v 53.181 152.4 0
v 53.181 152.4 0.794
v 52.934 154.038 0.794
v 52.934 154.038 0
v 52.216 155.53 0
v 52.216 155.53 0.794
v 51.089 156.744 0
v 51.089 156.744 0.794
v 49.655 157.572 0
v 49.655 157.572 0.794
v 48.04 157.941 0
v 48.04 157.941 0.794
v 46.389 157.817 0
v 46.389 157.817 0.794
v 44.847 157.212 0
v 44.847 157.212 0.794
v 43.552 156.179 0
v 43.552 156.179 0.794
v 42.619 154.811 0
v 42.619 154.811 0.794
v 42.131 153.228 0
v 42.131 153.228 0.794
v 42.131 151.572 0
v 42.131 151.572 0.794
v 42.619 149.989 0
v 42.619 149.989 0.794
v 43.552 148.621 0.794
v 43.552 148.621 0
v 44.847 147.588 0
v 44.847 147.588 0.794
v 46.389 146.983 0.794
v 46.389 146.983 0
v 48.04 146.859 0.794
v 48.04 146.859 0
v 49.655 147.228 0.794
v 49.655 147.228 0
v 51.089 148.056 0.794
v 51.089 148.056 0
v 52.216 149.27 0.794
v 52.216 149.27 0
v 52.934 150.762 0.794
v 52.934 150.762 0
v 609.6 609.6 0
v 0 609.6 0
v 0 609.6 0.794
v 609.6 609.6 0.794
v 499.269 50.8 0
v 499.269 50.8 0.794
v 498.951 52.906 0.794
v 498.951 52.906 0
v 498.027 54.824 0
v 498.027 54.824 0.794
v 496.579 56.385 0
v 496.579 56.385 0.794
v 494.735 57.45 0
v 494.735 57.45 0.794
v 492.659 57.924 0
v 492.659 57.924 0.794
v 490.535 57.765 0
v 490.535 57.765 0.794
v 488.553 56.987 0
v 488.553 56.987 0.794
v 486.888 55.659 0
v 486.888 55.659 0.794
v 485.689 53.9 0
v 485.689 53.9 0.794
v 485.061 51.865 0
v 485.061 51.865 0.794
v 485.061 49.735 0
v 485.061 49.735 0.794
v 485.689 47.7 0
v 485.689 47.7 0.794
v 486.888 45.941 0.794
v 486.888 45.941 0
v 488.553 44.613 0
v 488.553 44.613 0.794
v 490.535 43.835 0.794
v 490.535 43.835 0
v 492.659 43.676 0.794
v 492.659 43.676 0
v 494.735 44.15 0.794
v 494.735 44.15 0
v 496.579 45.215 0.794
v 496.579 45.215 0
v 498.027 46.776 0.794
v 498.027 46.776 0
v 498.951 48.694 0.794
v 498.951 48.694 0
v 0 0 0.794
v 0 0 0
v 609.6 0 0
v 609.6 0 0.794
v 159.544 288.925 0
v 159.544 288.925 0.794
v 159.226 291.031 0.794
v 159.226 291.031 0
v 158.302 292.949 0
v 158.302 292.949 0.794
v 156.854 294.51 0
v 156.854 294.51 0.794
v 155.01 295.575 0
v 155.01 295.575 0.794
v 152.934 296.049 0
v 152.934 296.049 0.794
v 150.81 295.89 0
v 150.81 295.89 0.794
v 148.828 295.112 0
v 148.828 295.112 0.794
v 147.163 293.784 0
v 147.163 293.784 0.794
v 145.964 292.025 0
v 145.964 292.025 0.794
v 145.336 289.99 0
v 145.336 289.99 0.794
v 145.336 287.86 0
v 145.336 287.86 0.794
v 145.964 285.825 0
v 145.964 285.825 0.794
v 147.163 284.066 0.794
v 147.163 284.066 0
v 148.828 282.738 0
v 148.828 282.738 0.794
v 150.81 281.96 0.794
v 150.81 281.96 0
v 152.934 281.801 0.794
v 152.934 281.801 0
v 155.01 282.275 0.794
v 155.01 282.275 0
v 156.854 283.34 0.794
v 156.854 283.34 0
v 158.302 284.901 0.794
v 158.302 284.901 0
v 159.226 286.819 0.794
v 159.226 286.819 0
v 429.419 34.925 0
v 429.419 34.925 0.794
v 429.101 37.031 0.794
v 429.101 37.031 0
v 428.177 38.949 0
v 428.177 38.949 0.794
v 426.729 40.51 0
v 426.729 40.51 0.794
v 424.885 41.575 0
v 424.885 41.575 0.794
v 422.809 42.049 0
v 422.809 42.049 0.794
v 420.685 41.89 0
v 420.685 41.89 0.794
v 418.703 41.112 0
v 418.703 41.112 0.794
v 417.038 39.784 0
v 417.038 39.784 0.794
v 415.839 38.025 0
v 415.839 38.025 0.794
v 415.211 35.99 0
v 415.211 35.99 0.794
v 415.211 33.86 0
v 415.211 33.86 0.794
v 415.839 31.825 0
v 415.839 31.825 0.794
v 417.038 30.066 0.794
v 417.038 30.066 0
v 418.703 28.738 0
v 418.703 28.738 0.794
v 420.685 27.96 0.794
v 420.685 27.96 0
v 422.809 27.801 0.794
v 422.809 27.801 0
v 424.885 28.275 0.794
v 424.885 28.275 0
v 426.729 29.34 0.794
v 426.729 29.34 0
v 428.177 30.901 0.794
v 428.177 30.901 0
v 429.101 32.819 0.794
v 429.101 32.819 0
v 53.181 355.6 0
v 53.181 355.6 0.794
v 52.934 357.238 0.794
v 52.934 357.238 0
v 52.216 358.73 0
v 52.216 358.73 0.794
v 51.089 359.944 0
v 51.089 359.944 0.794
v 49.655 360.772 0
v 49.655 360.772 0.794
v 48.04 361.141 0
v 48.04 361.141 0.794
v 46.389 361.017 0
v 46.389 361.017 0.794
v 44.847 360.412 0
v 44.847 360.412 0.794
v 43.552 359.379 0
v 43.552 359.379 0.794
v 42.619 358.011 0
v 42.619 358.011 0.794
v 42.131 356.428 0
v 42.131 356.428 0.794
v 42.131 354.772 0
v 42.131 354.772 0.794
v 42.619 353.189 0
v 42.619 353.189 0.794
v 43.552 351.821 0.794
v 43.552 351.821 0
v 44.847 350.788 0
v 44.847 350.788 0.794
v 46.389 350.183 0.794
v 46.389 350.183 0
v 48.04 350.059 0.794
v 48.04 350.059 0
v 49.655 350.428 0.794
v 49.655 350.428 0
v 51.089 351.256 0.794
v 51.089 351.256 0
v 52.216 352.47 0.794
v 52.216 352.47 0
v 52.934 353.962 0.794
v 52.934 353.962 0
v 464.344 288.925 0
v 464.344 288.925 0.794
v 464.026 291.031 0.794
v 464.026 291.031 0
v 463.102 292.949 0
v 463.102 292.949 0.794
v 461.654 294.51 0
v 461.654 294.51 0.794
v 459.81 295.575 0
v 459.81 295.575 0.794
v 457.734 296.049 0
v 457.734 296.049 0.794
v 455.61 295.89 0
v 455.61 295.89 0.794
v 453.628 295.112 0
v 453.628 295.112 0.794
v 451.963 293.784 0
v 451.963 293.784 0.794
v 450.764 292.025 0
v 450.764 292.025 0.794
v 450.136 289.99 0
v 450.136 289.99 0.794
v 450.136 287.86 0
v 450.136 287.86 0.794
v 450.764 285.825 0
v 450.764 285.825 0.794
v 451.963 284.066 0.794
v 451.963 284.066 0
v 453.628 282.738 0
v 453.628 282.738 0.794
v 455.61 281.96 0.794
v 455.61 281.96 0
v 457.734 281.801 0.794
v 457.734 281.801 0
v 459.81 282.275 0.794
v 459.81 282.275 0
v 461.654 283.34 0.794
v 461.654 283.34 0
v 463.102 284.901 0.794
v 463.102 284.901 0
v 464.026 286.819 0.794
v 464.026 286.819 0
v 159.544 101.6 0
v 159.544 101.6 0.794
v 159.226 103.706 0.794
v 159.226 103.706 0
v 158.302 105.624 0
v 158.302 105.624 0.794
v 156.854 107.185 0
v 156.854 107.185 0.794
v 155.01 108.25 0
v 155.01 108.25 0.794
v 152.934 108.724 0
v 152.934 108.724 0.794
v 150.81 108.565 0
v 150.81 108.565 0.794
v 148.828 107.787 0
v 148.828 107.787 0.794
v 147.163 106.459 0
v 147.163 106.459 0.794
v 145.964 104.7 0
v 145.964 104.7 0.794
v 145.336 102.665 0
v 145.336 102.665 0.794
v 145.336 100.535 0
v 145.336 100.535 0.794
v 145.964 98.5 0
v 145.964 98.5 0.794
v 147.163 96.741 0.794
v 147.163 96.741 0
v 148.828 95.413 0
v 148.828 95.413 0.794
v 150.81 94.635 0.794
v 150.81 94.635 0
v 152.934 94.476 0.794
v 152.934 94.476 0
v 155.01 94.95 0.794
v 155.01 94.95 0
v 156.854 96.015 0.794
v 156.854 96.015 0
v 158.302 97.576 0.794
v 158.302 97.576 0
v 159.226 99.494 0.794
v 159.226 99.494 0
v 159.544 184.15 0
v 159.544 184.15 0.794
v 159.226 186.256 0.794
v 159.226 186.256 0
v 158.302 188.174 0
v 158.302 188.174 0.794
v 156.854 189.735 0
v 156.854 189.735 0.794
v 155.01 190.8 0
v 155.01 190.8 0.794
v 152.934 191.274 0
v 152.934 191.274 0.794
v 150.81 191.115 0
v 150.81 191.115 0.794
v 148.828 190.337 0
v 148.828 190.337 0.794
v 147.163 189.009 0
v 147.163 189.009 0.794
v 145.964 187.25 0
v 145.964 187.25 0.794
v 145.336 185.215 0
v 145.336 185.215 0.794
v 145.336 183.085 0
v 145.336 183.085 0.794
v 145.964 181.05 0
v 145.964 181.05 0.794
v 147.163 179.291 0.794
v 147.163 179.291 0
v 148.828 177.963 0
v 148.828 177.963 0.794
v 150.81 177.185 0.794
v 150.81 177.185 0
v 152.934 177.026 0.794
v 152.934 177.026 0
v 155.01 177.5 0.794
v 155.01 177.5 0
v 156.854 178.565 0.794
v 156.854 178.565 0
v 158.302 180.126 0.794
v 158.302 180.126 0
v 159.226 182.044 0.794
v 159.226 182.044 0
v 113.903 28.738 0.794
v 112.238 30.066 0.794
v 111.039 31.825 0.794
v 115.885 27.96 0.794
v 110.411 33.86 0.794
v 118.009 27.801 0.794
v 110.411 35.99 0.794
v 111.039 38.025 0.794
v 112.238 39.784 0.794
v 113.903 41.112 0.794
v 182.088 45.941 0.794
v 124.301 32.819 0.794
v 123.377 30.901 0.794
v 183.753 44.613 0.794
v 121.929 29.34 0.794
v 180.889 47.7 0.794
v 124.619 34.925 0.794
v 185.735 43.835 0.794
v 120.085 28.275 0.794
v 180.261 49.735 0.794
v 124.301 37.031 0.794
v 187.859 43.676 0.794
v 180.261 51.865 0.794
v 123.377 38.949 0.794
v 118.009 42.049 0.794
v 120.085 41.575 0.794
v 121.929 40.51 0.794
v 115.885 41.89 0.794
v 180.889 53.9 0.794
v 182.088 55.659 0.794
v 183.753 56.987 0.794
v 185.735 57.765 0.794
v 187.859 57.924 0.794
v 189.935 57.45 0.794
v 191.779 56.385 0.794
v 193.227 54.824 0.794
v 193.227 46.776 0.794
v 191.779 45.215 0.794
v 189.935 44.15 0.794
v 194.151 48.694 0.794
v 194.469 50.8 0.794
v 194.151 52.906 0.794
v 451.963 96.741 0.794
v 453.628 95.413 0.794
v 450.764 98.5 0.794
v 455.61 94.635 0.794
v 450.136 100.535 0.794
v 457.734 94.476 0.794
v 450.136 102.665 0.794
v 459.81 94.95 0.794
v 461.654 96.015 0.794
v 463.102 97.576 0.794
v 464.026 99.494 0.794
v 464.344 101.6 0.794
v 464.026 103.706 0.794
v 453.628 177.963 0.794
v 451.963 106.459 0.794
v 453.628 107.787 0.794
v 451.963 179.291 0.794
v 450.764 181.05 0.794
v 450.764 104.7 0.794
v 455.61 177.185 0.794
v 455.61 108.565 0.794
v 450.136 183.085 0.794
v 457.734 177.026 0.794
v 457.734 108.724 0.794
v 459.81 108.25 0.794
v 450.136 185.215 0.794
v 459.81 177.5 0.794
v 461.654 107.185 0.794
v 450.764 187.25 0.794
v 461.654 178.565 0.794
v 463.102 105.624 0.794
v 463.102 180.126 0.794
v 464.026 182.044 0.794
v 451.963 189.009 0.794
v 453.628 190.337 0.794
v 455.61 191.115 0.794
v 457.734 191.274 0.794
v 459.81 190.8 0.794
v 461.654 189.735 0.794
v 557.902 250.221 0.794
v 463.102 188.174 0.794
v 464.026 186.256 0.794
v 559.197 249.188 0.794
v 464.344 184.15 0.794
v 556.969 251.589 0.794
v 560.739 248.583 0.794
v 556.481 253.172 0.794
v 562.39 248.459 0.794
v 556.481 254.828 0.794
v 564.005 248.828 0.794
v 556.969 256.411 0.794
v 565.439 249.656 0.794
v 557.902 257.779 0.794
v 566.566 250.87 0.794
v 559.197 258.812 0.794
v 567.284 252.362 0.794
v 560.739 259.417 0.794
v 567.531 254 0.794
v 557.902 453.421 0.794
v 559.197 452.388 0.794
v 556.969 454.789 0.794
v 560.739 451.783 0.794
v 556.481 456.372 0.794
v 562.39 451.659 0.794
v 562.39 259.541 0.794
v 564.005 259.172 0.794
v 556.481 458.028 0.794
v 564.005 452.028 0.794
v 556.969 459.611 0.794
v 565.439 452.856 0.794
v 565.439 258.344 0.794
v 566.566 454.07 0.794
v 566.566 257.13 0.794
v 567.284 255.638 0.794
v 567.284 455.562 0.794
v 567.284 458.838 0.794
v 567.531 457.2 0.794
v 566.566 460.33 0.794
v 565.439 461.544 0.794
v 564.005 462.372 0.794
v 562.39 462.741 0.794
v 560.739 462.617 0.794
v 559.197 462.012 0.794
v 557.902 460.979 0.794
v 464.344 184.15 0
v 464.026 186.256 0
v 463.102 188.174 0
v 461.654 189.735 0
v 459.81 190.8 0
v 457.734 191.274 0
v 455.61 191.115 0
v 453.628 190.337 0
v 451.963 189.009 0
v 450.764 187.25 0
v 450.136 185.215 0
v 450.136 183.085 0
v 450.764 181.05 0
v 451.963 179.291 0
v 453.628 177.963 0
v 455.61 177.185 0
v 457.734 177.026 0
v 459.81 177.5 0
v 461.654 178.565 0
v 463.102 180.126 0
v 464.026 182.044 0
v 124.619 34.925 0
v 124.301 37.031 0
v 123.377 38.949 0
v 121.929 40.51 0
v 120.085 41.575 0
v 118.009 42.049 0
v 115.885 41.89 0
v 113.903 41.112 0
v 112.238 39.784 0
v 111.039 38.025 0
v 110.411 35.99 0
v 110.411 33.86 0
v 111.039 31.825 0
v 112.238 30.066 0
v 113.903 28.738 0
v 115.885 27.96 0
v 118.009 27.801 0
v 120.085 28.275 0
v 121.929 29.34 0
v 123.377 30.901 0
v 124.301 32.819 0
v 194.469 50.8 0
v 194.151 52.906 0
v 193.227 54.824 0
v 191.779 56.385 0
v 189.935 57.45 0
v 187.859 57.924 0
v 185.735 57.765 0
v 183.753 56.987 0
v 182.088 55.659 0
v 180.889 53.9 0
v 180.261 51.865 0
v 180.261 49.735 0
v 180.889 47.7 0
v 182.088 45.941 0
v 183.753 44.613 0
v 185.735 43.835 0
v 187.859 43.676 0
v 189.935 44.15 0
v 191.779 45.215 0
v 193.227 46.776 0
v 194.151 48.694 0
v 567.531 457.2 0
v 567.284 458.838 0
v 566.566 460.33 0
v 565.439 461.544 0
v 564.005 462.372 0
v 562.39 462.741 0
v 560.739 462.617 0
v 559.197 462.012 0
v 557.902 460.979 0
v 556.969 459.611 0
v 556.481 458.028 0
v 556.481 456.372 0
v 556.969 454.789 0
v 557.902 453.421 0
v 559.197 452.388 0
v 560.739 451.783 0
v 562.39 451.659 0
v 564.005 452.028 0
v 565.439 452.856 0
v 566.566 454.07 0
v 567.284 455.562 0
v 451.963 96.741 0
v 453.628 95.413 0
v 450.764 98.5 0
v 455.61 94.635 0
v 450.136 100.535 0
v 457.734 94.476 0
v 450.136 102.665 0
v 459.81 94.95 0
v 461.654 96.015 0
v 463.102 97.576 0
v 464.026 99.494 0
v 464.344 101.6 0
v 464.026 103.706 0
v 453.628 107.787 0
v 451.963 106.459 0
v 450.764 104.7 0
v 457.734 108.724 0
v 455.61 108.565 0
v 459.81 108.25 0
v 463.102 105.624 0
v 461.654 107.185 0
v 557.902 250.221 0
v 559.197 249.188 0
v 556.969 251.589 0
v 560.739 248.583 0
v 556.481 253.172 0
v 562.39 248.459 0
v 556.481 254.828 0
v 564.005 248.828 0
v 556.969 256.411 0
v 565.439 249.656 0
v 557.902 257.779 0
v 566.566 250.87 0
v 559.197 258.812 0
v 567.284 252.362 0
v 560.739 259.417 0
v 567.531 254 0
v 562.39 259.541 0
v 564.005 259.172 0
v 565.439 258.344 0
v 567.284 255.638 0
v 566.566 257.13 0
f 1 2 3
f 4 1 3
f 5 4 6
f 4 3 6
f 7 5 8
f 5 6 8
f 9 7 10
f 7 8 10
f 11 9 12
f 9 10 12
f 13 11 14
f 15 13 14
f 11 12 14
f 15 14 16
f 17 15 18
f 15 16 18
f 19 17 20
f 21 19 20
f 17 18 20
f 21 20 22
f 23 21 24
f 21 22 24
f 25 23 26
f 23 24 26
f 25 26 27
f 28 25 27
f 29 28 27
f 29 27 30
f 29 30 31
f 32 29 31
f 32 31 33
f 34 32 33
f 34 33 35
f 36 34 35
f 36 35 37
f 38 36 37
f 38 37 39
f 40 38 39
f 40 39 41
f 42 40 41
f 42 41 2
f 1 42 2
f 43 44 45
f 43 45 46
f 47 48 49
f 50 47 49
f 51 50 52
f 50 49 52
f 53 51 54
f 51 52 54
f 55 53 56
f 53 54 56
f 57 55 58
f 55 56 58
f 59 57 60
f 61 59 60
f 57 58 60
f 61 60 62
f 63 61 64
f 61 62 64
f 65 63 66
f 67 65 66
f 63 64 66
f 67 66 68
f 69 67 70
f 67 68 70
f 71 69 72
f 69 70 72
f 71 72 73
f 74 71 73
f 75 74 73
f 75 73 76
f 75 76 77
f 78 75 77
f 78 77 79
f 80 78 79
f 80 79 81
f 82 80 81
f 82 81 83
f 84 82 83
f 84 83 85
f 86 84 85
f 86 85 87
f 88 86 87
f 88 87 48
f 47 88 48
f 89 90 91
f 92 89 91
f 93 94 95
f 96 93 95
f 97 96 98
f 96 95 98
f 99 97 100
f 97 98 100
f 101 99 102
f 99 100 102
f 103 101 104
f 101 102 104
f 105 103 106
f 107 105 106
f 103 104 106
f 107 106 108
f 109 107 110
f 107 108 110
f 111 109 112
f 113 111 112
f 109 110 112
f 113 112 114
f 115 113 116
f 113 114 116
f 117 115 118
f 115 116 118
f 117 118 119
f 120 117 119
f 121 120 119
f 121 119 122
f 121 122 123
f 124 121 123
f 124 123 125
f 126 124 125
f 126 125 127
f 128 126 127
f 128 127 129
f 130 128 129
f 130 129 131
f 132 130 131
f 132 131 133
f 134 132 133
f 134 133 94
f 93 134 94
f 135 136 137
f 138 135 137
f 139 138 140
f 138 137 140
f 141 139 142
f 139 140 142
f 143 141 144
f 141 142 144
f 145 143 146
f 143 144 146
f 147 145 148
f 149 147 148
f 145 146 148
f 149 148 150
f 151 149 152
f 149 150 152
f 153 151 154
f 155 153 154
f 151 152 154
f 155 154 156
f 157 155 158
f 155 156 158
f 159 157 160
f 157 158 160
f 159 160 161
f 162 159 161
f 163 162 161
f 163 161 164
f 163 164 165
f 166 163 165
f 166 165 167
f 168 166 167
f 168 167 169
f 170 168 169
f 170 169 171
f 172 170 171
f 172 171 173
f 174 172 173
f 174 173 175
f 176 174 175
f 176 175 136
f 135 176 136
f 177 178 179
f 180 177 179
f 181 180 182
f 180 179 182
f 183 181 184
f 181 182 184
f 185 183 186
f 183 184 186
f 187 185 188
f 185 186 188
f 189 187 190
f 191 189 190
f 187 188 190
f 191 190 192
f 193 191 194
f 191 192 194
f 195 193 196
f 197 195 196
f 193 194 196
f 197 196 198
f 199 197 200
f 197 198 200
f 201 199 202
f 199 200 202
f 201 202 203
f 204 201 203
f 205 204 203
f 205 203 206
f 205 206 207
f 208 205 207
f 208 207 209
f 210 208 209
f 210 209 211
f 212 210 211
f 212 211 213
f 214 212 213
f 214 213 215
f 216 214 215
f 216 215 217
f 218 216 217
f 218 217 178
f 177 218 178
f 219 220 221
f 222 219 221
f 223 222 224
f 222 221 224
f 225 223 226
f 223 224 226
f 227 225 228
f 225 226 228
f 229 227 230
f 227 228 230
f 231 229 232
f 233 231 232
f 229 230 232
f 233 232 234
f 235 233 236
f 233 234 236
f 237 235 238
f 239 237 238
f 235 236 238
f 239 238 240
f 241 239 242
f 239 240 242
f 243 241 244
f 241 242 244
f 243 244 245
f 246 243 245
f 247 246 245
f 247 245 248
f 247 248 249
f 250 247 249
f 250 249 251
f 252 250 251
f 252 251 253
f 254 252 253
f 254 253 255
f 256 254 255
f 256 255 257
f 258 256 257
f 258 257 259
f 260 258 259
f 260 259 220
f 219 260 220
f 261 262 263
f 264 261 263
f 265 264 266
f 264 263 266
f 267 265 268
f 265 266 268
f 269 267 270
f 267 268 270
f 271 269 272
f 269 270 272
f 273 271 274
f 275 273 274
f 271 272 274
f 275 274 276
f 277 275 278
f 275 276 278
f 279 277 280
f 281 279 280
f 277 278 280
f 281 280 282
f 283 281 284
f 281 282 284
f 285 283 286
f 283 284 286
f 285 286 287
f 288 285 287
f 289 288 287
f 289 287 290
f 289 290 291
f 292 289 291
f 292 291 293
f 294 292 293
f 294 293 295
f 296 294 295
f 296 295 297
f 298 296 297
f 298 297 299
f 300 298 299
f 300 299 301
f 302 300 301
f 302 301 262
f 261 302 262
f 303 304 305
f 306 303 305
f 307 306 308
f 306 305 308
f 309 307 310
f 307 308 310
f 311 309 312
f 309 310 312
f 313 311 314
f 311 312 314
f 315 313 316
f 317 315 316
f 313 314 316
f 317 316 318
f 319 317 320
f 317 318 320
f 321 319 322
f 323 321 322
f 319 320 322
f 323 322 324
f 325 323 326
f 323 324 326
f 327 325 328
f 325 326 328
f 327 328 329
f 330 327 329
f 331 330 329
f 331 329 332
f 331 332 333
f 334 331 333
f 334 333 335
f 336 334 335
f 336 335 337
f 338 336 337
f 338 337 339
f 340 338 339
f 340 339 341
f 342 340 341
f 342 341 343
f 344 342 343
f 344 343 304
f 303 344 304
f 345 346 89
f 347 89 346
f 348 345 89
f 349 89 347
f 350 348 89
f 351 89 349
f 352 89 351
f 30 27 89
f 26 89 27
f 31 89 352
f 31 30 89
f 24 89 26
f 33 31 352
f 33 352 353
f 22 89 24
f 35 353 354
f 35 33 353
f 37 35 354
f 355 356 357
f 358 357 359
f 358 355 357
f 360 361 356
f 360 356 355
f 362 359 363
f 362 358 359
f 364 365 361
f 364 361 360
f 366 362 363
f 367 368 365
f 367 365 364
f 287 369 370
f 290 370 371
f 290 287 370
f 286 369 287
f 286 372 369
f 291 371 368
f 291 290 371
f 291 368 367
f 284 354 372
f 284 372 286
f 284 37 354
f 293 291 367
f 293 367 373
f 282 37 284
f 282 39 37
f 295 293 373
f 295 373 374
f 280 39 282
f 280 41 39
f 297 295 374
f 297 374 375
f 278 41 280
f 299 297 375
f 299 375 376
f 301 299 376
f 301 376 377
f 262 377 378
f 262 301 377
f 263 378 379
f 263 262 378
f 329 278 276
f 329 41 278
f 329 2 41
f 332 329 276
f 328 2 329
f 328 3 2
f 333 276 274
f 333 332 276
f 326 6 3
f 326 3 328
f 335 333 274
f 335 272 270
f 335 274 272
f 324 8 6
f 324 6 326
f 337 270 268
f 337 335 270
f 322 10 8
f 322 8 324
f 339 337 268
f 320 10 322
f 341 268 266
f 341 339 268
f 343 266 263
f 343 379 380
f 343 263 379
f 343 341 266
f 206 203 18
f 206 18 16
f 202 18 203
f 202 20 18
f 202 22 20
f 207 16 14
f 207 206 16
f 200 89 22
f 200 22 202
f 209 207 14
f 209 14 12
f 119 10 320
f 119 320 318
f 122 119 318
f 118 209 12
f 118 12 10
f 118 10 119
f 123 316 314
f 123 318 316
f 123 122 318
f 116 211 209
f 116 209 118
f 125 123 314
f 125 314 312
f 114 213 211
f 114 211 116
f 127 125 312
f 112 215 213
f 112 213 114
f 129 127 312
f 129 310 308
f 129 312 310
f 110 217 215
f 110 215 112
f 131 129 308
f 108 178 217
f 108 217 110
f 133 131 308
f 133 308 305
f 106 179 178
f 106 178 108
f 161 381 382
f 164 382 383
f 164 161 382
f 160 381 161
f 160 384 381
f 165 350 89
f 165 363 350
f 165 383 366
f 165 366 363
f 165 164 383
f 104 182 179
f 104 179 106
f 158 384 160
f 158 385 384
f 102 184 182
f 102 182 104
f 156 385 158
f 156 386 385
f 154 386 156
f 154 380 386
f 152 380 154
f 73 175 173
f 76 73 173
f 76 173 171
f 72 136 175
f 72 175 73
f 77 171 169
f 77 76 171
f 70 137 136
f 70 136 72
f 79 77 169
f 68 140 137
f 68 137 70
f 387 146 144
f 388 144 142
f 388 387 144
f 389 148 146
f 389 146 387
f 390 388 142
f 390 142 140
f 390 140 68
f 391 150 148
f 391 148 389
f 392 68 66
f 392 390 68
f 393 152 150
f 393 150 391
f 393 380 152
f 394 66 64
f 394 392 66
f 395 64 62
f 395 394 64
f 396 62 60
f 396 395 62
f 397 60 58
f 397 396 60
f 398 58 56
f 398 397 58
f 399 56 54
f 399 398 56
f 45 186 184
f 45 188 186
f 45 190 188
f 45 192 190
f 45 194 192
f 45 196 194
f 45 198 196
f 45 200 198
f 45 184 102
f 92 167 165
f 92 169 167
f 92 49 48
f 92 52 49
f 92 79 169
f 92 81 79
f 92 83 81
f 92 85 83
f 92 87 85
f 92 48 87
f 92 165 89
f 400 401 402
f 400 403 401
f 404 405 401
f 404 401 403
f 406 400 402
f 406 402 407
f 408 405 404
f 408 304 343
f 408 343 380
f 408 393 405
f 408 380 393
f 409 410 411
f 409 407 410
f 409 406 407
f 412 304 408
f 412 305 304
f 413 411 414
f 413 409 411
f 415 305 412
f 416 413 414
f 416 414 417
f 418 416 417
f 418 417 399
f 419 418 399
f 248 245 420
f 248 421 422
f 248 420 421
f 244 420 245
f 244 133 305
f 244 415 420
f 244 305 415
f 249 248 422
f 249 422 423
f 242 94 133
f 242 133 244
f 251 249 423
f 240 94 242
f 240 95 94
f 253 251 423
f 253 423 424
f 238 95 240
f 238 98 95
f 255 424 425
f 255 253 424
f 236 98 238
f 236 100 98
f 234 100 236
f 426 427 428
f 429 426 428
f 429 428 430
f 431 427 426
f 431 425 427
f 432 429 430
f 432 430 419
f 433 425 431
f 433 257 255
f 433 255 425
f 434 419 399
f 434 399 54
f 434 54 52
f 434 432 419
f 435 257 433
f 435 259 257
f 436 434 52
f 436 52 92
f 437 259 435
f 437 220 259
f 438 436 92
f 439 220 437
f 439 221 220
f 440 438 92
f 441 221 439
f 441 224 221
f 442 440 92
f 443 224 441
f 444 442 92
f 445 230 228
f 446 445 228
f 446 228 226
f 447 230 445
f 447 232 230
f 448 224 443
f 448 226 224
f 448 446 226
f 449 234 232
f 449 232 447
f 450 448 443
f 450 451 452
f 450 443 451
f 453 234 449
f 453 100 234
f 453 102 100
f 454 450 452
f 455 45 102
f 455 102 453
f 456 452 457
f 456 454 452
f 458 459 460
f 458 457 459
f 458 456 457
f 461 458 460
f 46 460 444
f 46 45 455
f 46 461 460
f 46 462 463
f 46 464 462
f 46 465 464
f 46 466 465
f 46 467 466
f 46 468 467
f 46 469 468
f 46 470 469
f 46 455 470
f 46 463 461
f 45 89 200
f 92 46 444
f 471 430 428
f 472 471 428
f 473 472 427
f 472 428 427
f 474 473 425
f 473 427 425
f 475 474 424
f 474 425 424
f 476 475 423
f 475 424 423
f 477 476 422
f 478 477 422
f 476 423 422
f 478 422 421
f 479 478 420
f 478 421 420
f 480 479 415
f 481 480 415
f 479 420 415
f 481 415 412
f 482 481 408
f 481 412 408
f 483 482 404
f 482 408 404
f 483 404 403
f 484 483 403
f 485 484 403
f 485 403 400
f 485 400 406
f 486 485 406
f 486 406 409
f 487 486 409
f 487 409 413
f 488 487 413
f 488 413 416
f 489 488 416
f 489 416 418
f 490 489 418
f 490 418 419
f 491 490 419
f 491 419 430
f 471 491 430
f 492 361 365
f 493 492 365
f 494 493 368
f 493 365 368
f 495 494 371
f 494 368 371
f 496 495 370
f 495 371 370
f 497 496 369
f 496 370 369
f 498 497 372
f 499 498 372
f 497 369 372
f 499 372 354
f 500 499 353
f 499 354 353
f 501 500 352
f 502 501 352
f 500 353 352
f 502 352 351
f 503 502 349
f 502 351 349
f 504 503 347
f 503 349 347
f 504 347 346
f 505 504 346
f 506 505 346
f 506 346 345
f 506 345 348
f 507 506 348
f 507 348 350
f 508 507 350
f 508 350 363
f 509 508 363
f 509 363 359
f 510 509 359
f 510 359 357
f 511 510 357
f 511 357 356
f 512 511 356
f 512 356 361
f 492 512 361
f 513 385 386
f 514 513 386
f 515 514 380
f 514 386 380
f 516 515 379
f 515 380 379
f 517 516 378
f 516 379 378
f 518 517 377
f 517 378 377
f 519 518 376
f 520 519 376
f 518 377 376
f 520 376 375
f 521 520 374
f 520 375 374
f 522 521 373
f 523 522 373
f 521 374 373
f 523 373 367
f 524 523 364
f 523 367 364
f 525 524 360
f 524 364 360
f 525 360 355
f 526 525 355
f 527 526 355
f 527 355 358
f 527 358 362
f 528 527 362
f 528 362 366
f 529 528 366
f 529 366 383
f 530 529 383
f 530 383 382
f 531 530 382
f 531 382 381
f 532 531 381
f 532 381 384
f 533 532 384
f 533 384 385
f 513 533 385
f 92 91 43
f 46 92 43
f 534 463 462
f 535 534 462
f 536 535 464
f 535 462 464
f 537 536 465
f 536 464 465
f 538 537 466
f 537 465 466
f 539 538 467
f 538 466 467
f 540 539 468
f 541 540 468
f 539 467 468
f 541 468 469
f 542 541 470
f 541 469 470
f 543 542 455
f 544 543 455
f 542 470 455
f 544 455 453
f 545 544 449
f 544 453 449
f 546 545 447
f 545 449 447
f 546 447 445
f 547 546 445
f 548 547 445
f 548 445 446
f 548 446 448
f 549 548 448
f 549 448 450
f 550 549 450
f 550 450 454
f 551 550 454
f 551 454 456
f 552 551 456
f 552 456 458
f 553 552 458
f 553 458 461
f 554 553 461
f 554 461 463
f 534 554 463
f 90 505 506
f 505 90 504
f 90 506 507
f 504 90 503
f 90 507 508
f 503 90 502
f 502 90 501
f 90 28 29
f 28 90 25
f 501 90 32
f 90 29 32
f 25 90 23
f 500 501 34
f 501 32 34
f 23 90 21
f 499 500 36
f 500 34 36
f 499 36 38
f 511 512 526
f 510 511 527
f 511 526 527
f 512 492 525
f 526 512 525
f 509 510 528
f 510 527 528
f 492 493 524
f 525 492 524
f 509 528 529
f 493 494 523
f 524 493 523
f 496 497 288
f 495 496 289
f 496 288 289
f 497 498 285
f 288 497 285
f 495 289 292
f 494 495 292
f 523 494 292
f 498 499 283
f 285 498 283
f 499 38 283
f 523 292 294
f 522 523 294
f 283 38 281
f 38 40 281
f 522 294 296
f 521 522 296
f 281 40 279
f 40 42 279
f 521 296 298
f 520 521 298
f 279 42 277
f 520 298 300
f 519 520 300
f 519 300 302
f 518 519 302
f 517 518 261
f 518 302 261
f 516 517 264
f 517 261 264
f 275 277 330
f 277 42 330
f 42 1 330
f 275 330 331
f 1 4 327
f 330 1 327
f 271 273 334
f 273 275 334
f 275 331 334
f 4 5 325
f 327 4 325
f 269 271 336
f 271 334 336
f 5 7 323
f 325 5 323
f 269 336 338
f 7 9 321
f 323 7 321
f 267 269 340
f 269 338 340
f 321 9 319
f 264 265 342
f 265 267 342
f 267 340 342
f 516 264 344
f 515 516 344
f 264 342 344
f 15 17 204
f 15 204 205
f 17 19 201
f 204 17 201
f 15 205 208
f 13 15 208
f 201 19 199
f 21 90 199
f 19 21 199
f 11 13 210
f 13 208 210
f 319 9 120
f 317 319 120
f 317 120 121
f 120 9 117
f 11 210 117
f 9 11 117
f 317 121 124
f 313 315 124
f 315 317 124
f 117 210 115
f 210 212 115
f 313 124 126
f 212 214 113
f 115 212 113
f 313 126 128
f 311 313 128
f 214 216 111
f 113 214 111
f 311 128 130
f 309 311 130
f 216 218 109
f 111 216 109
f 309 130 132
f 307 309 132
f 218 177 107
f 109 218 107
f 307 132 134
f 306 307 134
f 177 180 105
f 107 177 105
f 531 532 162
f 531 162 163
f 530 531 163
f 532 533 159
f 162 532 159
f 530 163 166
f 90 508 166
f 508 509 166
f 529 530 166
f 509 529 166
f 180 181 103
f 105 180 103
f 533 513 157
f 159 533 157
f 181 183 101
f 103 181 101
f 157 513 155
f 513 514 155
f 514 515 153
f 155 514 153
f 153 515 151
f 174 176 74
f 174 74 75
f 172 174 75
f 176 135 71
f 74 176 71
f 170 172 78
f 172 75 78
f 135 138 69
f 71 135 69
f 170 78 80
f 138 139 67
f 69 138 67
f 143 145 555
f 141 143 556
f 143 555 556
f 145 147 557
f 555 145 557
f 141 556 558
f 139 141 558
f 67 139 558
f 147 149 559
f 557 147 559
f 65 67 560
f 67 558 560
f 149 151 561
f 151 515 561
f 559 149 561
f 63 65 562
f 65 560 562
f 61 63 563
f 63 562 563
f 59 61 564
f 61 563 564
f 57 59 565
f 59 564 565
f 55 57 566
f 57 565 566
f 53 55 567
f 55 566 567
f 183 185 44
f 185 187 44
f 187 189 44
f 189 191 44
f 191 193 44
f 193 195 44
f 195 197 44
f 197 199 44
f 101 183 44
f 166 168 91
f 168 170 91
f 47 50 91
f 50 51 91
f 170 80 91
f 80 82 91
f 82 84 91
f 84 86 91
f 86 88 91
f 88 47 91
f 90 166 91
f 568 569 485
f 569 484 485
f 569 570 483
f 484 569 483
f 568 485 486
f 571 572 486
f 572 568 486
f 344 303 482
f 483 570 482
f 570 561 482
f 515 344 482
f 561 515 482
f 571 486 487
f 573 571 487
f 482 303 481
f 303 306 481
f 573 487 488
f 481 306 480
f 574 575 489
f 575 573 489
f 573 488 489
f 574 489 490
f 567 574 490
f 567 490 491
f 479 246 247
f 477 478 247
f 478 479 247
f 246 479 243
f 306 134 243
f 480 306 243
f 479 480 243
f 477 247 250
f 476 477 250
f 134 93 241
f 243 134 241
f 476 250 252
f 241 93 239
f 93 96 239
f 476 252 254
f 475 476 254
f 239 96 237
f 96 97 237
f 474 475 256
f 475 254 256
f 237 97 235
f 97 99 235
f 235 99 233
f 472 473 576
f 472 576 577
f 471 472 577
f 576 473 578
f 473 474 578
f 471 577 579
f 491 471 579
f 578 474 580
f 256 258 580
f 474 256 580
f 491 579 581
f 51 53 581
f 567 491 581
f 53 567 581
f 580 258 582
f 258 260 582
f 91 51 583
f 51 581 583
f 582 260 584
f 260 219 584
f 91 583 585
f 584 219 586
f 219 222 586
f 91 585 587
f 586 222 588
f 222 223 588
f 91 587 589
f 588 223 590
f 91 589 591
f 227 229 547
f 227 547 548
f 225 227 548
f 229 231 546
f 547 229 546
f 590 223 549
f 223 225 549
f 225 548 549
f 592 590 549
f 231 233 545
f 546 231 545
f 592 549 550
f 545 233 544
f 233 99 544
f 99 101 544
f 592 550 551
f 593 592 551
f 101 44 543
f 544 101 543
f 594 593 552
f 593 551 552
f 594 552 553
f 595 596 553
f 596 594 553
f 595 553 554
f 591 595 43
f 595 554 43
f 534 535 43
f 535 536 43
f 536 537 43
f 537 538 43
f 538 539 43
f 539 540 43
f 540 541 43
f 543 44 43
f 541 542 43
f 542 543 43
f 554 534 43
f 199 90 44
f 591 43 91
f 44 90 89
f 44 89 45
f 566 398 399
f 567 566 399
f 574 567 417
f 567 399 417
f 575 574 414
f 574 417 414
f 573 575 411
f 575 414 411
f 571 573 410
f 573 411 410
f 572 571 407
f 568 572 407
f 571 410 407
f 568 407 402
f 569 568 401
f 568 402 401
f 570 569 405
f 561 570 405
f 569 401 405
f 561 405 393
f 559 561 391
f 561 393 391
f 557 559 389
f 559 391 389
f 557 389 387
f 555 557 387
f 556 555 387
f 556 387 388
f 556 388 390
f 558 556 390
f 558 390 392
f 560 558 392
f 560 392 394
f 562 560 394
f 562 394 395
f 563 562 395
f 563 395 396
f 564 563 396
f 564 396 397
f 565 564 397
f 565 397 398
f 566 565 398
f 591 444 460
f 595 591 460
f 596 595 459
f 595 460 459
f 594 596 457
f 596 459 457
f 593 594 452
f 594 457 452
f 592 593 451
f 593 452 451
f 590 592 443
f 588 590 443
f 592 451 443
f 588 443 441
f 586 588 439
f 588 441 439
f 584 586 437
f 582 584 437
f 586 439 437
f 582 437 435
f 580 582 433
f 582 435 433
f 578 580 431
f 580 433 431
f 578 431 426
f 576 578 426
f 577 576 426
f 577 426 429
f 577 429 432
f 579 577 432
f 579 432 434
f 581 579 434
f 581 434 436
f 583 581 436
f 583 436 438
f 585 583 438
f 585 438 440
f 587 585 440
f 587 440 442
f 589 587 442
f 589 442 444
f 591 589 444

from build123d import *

# Parameters (mm, degrees)
F0_W     = 609.6
F0_H     = 609.6
F1_DEPTH = 0.79375
F2_R     = 5.55625
F3_DEPTH = 25.4
F4_R     = 7.14375
F5_DEPTH = 25.4


# Not quite as in the source:
# - a feature names something its author has since deleted; it is built from what else it names


with BuildPart() as f1:
    # F0 (on Top) → F1 (new body)
    with BuildSketch(Plane.XY):
        with Locations((304.8, 304.8)):
            Rectangle(F0_W, F0_H)
    extrude(amount=F1_DEPTH)

    # F2 (on face) → F3 (cut)
    with BuildSketch(Plane.XY.offset(0.79375)):
        with Locations((47.625, 152.4)):
            Circle(F2_R)
        with Locations((47.625, 355.6)):
            Circle(F2_R)
        with Locations((561.975, 254)):
            Circle(F2_R)
        with Locations((561.975, 457.2)):
            Circle(F2_R)
    extrude(amount=-F3_DEPTH, mode=Mode.SUBTRACT)

    # F4 (on face) → F5 (cut)
    with BuildSketch(Plane.XY.offset(0.79375)):
        with Locations((187.325, 50.8)):
            Circle(F4_R)
        with Locations((117.475, 34.925)):
            Circle(F4_R)
        with Locations((152.4, 101.6)):
            Circle(F4_R)
        with Locations((152.4, 184.15)):
            Circle(F4_R)
        with Locations((152.4, 288.925)):
            Circle(F4_R)
        with Locations((422.275, 34.925)):
            Circle(F4_R)
        with Locations((492.125, 50.8)):
            Circle(F4_R)
        with Locations((457.2, 101.6)):
            Circle(F4_R)
        with Locations((457.2, 184.15)):
            Circle(F4_R)
        with Locations((457.2, 288.925)):
            Circle(F4_R)
    extrude(amount=-F5_DEPTH, mode=Mode.SUBTRACT)


solid = f1.part
